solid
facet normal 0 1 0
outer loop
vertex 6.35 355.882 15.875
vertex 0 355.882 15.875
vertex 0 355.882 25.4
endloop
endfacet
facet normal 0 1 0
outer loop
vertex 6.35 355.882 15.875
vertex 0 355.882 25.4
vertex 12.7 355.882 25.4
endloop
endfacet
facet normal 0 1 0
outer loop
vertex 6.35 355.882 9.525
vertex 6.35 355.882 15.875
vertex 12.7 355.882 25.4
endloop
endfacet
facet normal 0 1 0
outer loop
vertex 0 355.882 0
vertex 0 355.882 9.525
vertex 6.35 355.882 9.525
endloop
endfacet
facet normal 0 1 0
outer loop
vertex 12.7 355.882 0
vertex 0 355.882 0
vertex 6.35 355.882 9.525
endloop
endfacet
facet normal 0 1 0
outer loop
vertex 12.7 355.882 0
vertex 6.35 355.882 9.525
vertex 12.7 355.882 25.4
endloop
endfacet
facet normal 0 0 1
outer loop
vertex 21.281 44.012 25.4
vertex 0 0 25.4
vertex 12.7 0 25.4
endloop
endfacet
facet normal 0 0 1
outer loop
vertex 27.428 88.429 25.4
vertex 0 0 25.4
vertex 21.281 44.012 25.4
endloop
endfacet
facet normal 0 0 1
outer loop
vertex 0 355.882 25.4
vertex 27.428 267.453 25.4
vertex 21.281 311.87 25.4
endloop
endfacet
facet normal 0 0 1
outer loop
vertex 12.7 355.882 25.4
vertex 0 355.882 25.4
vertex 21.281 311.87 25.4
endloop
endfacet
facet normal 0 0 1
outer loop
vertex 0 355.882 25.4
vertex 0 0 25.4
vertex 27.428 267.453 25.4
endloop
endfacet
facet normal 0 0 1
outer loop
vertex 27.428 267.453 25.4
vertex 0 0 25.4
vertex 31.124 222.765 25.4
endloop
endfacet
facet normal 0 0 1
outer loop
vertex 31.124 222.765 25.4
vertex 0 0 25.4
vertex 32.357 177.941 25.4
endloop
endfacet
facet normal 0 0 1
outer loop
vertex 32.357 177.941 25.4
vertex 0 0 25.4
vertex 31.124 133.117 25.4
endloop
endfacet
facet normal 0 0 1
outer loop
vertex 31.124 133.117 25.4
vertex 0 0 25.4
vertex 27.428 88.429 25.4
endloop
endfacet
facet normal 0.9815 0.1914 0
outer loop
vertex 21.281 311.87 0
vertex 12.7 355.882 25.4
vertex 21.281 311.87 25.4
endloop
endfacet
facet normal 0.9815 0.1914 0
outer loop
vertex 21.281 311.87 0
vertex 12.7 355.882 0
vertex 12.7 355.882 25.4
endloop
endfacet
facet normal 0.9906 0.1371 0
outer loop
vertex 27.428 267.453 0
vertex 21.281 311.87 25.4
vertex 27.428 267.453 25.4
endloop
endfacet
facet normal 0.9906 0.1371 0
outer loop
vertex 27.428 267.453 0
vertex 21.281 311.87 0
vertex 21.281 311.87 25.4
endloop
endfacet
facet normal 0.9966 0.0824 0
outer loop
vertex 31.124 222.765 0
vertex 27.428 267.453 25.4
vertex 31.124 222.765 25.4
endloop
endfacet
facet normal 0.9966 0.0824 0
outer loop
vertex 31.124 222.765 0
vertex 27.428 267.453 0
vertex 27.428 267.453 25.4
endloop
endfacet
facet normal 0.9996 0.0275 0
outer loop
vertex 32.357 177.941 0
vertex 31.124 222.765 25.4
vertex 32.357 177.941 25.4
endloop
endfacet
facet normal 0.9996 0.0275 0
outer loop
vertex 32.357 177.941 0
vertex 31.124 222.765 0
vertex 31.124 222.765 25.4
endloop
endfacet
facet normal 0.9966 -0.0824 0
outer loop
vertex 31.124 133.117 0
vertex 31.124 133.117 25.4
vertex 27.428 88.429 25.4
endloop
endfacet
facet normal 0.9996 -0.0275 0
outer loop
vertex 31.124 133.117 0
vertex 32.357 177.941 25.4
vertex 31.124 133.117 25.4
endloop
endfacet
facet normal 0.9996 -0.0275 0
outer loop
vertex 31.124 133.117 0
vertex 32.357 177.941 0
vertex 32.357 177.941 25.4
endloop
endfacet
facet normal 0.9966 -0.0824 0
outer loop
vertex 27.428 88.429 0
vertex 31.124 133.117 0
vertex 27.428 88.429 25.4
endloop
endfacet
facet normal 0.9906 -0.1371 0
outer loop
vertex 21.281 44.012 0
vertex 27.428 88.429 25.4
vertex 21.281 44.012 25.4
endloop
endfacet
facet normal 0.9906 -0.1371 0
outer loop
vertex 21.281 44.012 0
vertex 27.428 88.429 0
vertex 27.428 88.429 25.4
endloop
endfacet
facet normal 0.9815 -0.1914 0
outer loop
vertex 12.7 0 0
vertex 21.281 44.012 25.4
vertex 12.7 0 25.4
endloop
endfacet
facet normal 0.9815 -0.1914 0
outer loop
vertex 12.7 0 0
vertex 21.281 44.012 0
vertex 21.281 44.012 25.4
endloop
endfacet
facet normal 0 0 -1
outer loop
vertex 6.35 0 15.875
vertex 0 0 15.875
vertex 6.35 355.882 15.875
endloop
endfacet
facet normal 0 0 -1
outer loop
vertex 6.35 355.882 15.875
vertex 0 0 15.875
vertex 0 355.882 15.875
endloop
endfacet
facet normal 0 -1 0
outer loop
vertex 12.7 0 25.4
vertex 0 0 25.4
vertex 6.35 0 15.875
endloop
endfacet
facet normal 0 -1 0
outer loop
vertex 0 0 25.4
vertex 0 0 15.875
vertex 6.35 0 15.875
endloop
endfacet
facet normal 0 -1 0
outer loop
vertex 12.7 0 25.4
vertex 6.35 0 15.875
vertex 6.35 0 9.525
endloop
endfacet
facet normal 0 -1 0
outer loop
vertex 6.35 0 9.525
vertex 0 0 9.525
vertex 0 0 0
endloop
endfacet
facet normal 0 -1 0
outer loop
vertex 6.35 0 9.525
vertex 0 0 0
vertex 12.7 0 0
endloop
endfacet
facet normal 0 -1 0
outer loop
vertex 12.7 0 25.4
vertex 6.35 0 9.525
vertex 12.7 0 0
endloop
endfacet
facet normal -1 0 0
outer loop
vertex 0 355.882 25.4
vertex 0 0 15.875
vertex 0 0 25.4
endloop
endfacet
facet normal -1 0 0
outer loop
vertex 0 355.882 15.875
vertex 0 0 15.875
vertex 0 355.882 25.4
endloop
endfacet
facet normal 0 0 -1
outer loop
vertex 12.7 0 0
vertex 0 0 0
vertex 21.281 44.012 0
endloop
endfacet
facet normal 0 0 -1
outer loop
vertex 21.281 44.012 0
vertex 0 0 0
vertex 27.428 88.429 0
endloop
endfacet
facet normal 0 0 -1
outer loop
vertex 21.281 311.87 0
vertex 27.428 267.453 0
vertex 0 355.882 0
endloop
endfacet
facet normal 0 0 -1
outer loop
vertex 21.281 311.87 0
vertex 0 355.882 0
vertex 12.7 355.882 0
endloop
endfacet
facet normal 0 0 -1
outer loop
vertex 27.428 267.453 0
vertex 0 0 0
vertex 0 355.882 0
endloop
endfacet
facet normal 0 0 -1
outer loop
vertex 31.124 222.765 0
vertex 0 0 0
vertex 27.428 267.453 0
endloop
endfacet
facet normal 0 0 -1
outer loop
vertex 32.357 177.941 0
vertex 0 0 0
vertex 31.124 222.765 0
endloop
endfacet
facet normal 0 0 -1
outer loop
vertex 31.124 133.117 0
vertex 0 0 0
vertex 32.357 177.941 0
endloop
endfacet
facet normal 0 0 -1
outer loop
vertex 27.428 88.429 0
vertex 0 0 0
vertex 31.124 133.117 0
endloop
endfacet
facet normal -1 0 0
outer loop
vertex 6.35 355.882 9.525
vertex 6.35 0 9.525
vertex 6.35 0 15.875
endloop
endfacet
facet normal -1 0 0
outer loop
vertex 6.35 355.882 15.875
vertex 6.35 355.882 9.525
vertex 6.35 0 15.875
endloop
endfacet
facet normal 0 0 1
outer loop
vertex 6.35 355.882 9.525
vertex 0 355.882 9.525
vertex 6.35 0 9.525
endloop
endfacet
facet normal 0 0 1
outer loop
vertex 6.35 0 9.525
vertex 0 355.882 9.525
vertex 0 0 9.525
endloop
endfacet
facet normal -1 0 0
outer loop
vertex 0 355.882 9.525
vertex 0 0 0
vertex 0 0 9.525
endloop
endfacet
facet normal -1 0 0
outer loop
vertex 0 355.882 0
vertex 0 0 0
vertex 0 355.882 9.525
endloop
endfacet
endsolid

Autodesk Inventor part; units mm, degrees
ref_plane "YZ Plane" through (0, 0, 0) normal (1, 0, 0) x (0, 1, 0)
ref_plane "XZ Plane" through (0, 0, 0) normal (0, 1, 0) x (-1, 0, 0)
ref_plane "XY Plane" through (0, 0, 0) normal (0, 0, 1) x (1, 0, 0)
sketch "Sketch1" plane through (0, 0, 0) normal (0, 0, 1) x (1, 0, 0)
  line L0 (0, 0) -> (12.7, 0)
  line L1 (0, 0) -> (0, 355.8819)
  line L2 (0, 355.8819) -> (12.7, 355.8819)
  arc A0 (12.7, 0) -> (12.7, 355.8819) centre (-782.8431, 177.941) ccw
  dimension "d0" = 12.7
  dimension "d1" = 355.8819
  dimension "d2" = 12.7
extrude "Extrusion1" add sketch "Sketch1" along normal blind 25.4
sketch "Sketch2" plane through (0, 0, 0) normal (-1, 0, 0) x (0, 0, 1)
  line L0 (0, 0) -> (12.7, 0)
  line L1 (0, 0) -> (25.4, 0) projected
  line L2 (12.7, 355.8819) -> (9.525, 355.8819)
  line L3 (9.525, 355.8819) -> (9.525, 0)
  line L4 (9.525, 0) -> (15.875, 0)
  line L5 (15.875, 0) -> (15.875, 355.8819)
  line L6 (9.525, 355.8819) -> (15.875, 355.8819)
  line L7 (9.525, 0) -> (15.875, 0)
  dimension "d5" = 12.7
  dimension "d6" = 3.175
  dimension "d7" = 6.35
extrude "Extrusion2" cut sketch "Sketch2" against normal blind 6.35
sketch "Sketch3" plane through (0, 355.8819, 0) normal (0, 1, 0) x (1, 0, 0)
  line L0 (12.7, -25.4) -> (0, -25.4) projected
  line L1 (12.7, 0) -> (0, 0) projected
  line L2 (0, -9.525) -> (6.35, -9.525) projected
  line L3 (6.35, -15.875) -> (0, -15.875) projected
  line L4 (6.35, -9.525) -> (6.35, -15.875) projected
  line L5 (0, -15.875) -> (0, -25.4) projected
  line L6 (12.7, 0) -> (12.7, -25.4) projected
  point P0 (6.35, 0)
  dimension "d10" = 25.4
  dimension "d11" = 9.525
  dimension "d12" = 6.35
  dimension "d13" = 6.35
  dimension "d14" = 12.7
sketch "Sketch4" plane through (0, 0, 25.4) normal (0, 0, 1) x (1, 0, 0)
  line L0 (12.7, 355.8819) -> (0, 355.8819) projected
  line L1 (0, 0) -> (12.7, 0) projected
  dimension "d15" = 355.8819
properties part number "sidestrip_Ocampo"
